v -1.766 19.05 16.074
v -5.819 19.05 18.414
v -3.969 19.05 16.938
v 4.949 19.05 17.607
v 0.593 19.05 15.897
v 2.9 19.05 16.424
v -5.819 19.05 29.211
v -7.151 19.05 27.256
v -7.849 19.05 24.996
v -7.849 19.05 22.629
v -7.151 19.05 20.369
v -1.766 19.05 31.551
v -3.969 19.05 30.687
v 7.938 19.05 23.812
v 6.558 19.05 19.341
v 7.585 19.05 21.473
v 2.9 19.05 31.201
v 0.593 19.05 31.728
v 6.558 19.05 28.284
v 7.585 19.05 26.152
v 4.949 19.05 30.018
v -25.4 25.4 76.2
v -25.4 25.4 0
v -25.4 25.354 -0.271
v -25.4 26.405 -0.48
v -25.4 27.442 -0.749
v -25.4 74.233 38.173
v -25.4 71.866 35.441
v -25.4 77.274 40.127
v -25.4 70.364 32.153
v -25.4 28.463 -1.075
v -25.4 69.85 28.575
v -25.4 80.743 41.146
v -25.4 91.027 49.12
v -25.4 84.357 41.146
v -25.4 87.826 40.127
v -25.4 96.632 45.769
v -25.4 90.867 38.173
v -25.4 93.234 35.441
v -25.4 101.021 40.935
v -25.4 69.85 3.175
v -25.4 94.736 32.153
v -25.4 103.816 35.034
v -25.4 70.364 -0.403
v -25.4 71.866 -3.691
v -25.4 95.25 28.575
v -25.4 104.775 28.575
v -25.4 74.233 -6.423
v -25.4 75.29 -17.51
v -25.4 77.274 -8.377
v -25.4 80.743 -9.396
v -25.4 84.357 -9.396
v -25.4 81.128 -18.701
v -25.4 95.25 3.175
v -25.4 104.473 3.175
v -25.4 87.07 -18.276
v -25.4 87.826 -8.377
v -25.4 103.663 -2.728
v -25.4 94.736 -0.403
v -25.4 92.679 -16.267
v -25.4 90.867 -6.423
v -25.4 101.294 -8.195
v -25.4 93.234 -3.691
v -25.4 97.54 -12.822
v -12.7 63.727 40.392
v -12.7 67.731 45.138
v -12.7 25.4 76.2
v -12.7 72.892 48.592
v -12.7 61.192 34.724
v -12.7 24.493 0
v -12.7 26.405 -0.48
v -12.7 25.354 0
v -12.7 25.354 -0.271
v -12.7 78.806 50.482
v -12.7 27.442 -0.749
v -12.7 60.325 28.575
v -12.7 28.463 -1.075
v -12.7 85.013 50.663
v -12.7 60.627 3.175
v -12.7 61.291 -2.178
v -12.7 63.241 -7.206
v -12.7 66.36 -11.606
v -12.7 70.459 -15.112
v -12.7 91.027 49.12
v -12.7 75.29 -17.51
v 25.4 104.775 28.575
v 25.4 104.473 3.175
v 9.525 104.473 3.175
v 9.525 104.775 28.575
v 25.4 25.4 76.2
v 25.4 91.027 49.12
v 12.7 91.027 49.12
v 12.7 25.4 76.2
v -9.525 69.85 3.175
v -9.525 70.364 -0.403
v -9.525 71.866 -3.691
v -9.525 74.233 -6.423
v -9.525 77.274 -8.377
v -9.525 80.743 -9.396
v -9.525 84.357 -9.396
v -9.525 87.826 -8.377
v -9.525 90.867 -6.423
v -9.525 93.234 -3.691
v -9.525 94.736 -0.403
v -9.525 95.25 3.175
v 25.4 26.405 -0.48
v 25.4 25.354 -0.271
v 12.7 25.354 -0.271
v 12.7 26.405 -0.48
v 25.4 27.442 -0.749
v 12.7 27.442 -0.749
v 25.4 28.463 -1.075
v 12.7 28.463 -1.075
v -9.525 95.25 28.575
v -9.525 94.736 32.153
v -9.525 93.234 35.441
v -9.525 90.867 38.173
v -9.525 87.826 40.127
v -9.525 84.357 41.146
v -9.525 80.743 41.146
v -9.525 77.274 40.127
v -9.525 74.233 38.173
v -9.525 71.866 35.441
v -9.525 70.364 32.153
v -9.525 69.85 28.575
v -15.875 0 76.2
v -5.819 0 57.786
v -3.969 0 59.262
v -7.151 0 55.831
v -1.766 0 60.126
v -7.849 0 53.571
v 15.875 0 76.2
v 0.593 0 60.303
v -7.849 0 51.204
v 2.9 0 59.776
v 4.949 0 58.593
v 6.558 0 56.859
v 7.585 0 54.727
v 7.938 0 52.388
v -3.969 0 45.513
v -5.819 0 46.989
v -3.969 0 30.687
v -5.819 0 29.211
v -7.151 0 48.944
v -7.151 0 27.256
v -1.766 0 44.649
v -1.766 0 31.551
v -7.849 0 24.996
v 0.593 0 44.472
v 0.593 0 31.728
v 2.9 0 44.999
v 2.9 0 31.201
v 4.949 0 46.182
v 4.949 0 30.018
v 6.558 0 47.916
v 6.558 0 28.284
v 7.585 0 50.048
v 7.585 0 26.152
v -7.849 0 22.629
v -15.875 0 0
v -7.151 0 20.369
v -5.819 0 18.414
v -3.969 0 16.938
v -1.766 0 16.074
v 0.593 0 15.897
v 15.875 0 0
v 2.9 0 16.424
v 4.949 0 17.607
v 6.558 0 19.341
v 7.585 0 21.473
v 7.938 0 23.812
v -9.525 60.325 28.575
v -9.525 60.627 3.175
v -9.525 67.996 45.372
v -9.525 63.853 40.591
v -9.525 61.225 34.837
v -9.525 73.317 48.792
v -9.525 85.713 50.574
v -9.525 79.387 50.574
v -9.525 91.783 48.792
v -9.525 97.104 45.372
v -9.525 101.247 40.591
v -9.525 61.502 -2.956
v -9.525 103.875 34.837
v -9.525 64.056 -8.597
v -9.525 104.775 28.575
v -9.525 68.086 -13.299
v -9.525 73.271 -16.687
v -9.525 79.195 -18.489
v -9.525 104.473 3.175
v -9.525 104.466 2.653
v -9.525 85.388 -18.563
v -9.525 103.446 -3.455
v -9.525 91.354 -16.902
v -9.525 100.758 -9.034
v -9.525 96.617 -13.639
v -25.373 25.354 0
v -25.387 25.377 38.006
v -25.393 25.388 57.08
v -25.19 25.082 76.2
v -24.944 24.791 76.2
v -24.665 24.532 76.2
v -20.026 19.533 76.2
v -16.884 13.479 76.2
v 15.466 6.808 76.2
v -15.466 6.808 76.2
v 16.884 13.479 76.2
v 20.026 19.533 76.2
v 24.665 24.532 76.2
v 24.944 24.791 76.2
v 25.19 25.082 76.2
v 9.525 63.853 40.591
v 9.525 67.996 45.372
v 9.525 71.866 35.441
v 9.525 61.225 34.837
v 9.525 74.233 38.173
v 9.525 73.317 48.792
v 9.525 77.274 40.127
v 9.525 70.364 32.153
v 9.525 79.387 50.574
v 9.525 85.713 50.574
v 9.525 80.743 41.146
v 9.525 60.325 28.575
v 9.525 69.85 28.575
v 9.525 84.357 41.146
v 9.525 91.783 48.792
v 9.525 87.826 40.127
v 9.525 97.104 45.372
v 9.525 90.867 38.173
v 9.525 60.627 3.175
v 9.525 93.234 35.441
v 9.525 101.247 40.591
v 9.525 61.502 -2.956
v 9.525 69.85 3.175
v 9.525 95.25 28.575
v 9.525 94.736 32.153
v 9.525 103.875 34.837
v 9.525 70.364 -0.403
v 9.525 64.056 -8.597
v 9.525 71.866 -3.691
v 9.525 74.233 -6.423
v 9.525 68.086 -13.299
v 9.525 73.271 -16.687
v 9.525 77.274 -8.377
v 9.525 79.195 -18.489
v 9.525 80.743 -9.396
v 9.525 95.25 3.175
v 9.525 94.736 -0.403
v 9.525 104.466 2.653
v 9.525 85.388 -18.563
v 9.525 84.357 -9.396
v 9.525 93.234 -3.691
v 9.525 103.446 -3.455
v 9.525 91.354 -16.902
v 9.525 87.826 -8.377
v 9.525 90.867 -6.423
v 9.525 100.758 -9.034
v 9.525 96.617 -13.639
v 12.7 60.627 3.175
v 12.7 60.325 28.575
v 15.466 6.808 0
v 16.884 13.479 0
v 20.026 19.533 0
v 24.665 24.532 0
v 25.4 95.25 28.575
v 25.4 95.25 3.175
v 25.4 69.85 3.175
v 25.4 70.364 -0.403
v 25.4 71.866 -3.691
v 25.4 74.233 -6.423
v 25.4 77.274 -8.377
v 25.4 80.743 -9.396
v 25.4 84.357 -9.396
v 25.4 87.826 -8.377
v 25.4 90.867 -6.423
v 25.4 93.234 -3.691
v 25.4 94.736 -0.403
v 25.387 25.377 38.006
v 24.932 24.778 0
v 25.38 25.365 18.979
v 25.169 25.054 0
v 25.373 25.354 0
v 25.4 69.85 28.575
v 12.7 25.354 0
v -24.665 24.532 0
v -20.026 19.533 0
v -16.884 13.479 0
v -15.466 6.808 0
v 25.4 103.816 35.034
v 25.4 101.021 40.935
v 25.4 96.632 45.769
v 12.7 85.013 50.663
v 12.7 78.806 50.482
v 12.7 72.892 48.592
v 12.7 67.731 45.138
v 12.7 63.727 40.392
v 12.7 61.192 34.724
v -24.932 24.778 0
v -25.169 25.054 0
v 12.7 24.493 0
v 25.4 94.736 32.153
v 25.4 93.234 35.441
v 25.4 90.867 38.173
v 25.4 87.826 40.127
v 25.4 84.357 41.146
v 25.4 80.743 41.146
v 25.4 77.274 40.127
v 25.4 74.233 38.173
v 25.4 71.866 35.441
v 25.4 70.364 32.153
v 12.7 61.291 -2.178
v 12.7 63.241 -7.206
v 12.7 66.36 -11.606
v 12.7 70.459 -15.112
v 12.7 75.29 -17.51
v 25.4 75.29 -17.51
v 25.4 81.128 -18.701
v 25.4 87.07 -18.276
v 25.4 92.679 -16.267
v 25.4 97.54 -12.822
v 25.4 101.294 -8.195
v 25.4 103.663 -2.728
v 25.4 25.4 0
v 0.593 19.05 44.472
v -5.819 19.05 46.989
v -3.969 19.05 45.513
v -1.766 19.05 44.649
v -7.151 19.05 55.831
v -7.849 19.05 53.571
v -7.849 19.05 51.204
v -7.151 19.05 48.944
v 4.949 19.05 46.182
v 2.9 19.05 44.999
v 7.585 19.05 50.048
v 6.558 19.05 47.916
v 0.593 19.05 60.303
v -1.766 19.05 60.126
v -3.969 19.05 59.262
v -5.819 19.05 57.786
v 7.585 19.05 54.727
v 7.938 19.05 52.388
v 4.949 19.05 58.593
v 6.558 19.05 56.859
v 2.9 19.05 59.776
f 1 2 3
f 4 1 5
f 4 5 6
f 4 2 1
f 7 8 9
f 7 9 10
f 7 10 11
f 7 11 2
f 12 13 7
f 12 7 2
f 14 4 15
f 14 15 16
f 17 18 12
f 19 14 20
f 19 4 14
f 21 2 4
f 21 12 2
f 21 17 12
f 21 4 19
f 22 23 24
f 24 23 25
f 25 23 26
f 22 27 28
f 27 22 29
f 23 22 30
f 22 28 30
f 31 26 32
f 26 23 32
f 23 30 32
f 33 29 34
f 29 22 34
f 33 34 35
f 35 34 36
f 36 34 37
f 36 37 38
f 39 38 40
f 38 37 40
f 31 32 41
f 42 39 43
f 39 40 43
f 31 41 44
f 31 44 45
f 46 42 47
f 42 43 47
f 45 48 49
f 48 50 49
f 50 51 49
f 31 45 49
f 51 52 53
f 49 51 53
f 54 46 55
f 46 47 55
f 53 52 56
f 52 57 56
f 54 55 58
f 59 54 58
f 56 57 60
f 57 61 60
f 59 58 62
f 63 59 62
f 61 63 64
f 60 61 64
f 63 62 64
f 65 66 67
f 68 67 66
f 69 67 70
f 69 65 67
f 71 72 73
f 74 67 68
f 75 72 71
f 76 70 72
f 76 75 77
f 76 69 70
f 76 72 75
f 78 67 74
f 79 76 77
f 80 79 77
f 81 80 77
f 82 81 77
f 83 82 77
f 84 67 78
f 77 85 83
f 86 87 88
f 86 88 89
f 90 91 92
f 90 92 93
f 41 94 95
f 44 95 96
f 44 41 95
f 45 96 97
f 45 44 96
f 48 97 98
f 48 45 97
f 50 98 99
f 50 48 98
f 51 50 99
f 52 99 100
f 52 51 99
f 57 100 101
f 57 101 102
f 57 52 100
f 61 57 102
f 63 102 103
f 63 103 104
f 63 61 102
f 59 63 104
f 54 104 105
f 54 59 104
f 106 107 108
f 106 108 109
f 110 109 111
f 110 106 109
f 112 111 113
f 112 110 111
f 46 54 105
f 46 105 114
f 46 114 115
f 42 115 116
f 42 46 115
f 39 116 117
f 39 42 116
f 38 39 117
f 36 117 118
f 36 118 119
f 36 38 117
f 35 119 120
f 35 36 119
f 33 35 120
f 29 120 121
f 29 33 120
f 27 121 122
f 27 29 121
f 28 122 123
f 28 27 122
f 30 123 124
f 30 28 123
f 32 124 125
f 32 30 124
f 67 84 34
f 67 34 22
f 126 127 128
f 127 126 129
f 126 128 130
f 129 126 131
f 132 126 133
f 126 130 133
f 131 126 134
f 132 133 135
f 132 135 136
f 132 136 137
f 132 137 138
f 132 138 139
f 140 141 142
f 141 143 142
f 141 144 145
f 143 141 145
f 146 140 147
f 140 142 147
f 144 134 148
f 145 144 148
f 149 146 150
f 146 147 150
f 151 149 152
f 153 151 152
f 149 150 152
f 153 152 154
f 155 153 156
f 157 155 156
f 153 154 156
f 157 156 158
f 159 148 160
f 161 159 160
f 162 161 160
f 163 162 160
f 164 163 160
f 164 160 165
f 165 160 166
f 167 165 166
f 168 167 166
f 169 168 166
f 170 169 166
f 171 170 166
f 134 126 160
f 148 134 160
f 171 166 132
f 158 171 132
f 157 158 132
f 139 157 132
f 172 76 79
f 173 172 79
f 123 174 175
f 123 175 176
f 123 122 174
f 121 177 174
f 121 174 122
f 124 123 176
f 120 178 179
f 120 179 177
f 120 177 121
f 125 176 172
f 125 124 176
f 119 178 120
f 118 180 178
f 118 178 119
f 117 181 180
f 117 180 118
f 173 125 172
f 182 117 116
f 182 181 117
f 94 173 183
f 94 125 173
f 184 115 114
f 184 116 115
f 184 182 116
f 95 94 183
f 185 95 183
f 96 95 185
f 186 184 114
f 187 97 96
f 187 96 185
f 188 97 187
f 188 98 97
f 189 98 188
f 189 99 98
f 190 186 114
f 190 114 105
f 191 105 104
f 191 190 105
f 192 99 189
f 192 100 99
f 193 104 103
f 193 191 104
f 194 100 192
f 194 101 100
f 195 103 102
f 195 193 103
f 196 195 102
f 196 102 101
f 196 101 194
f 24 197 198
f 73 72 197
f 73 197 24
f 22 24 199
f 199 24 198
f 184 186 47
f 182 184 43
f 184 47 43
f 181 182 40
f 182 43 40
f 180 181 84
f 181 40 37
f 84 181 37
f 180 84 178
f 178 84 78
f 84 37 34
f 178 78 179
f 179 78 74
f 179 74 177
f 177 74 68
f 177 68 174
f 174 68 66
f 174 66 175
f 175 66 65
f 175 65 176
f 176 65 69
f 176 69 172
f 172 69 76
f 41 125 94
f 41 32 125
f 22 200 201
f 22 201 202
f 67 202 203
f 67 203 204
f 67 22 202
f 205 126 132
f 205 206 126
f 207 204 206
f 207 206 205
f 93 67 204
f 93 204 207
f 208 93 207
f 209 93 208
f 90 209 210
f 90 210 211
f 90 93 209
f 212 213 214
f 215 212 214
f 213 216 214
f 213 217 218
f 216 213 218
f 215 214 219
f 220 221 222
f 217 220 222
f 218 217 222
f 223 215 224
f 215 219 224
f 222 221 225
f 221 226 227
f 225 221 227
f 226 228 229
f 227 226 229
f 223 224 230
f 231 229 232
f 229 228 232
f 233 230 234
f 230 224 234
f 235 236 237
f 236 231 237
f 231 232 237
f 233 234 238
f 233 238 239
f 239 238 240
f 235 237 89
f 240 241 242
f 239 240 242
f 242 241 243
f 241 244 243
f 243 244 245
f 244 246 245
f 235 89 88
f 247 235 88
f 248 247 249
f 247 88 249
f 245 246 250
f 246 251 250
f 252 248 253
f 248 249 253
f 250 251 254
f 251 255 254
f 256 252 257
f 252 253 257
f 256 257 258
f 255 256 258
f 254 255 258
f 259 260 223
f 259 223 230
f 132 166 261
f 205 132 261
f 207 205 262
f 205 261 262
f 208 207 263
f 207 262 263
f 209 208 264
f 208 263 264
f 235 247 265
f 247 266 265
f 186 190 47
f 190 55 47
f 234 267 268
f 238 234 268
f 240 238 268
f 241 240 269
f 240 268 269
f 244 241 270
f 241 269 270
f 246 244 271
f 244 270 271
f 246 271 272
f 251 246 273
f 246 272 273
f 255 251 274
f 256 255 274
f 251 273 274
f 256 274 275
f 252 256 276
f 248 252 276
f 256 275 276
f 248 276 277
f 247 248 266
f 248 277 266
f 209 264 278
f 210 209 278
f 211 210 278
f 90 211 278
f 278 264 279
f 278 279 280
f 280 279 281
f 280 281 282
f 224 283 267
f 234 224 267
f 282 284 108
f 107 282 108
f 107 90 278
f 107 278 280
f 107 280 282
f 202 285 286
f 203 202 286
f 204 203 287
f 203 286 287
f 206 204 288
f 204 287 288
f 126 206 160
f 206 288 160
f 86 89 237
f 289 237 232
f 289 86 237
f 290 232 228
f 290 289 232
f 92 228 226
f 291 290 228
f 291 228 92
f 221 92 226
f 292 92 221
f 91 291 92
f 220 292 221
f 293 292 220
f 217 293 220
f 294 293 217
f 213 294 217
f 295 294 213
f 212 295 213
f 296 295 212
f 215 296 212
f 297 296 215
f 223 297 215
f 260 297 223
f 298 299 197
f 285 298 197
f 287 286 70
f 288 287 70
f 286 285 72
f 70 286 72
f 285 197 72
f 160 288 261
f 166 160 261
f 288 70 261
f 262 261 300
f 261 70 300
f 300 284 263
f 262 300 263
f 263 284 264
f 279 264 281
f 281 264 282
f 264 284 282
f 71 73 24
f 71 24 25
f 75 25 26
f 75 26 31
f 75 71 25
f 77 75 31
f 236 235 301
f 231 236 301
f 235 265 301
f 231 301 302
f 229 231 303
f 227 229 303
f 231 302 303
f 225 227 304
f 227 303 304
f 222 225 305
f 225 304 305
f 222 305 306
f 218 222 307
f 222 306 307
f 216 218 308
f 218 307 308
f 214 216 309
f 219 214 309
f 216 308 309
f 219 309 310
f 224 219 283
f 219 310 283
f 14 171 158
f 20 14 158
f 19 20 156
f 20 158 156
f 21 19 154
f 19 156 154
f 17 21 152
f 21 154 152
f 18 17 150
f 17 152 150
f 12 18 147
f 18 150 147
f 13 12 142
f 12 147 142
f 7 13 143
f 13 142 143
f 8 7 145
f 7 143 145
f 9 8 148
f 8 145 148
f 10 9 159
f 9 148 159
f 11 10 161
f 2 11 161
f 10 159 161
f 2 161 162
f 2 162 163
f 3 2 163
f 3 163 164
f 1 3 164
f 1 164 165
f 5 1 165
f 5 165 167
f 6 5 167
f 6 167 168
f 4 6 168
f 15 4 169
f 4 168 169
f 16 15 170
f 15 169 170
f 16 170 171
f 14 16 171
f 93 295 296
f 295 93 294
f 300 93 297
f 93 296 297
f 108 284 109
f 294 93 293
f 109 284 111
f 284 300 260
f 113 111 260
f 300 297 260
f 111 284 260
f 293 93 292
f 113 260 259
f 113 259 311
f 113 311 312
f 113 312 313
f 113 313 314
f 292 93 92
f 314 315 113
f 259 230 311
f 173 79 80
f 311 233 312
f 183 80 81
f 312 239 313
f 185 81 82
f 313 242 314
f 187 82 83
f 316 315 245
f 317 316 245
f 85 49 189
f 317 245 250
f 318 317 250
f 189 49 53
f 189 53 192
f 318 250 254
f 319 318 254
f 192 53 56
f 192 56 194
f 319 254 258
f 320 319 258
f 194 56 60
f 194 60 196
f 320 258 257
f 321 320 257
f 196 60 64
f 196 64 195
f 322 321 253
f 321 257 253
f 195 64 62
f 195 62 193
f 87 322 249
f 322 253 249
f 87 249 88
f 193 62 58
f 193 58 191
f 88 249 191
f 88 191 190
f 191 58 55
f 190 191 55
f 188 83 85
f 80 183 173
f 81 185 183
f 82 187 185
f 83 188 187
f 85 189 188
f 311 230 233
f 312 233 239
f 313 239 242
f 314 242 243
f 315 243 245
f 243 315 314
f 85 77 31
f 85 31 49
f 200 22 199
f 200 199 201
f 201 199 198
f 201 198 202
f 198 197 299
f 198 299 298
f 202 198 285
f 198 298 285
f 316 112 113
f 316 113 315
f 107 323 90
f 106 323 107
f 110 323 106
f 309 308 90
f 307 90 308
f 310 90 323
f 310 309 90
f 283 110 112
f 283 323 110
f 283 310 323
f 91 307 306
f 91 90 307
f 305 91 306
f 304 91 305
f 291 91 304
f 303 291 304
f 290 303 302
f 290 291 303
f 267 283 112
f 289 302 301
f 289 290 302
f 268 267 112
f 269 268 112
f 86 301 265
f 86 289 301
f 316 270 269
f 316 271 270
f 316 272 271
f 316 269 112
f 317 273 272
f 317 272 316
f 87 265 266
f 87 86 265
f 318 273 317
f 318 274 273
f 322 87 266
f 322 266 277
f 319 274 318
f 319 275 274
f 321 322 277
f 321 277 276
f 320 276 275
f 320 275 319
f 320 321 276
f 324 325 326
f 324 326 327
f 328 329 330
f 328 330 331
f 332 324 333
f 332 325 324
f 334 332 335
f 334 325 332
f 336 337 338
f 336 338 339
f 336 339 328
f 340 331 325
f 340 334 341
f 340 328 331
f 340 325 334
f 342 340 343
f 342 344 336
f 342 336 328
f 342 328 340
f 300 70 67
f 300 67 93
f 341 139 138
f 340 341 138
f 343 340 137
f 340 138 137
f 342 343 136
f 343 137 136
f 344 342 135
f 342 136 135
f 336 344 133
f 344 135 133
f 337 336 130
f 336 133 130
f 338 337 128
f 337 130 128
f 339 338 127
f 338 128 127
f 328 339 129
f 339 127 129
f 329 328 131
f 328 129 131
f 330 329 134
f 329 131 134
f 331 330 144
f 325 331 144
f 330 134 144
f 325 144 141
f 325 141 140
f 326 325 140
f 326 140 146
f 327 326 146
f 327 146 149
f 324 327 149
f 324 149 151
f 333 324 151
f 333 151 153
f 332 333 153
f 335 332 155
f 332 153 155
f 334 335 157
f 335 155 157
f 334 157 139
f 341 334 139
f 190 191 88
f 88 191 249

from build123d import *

# Parameters (mm, degrees)
BOSS_EXTRUDE1_DEPTH = 76.2
BOSS_EXTRUDE3_DEPTH = 25.4
SKETCH4_W           = 25.4
SKETCH4_H           = 94.262089718
CUT_EXTRUDE1_DEPTH  = 79.936326
BOSS_EXTRUDE4_START = 12.7
BOSS_EXTRUDE4_DEPTH = 3.175
BOSS_EXTRUDE5_START = -12.7
BOSS_EXTRUDE5_DEPTH = 3.175
SKETCH5_R           = 7.9375
CUT_EXTRUDE2_DEPTH  = 19.05


with BuildPart() as part:
    # Sketch2 → Boss-Extrude1 (new body)
    with BuildSketch(Plane.XY):
        with BuildLine():
            Line((-15.875, 0), (15.875, 0))
            ThreePointArc((15.875, 0), (16.884197435, 13.479245674), (24.665075731, 24.532140152))
            ThreePointArc((24.665075731, 24.532140152), (25.071711114, 24.932897242), (25.4, 25.4))
            Line((25.4, 25.4), (-25.4, 25.4))
            ThreePointArc((-25.4, 25.4), (-25.071711114, 24.932897242), (-24.665075731, 24.532140152))
            ThreePointArc((-24.665075731, 24.532140152), (-16.884197435, 13.479245674), (-15.875, 0))
        make_face()
    extrude(amount=BOSS_EXTRUDE1_DEPTH)

    # Sketch3 → Boss-Extrude3 (add, symmetric)
    with BuildSketch(Plane(origin=(0, 0, 0), x_dir=(0, 0, -1), z_dir=(1, 0, 0))):
        with BuildLine():
            Line((-28.575, 60.325), (-3.175, 60.627395043))
            ThreePointArc((-3.175, 60.627395043), (18.747604957, 82.55), (-3.175, 104.472604957))
            Line((-3.175, 104.472604957), (-28.575, 104.775))
            ThreePointArc((-28.575, 104.775), (-50.8, 82.55), (-28.575, 60.325))
        make_face()
        with BuildLine():
            ThreePointArc((-3.175, 69.85), (9.525, 82.55), (-3.175, 95.25))
            Line((-3.175, 95.25), (-28.575, 95.25))
            ThreePointArc((-28.575, 95.25), (-41.275, 82.55), (-28.575, 69.85))
            Line((-28.575, 69.85), (-3.175, 69.85))
        make_face(mode=Mode.SUBTRACT)
        with BuildLine():
            Line((-76.2, 25.4), (0.270677579, 25.353877505))
            ThreePointArc((0.270677579, 25.353877505), (0.607218741, 26.92535435), (1.075018311, 28.462872802))
            Line((1.075018311, 28.462872802), (17.510481505, 75.289733957))
            ThreePointArc((17.510481505, 75.289733957), (9.502473403, 64.664746962), (-3.175, 60.627395043))
            Line((-3.175, 60.627395043), (-28.575, 60.325))
            ThreePointArc((-28.575, 60.325), (-47.046096671, 70.190015665), (-49.119653814, 91.02748929))
            Line((-49.119653814, 91.02748929), (-76.2, 25.4))
        make_face()
    extrude(amount=BOSS_EXTRUDE3_DEPTH, both=True)

    # Sketch4 → Cut-Extrude1 (cut)
    with BuildSketch(Plane(origin=(0, 104.420005444, -1.243153229), x_dir=(1, 0, 0), z_dir=(0, 0.999929139, -0.011904473))):
        with Locations((0, -29.365929167)):
            Rectangle(SKETCH4_W, SKETCH4_H)
    extrude(amount=-CUT_EXTRUDE1_DEPTH, mode=Mode.SUBTRACT)

    # Sketch3<7> → Boss-Extrude4 (add)
    with BuildSketch(Plane(origin=(0, 0, 0), x_dir=(0, 0, -1), z_dir=(1, 0, 0)).offset(BOSS_EXTRUDE4_START)):
        with BuildLine():
            Line((-28.575, 60.325), (-3.175, 60.627395043))
            ThreePointArc((-3.175, 60.627395043), (18.747604957, 82.55), (-3.175, 104.472604957))
            Line((-3.175, 104.472604957), (-28.575, 104.775))
            ThreePointArc((-28.575, 104.775), (-50.8, 82.55), (-28.575, 60.325))
        make_face()
        with BuildLine():
            ThreePointArc((-3.175, 69.85), (9.525, 82.55), (-3.175, 95.25))
            Line((-3.175, 95.25), (-28.575, 95.25))
            ThreePointArc((-28.575, 95.25), (-41.275, 82.55), (-28.575, 69.85))
            Line((-28.575, 69.85), (-3.175, 69.85))
        make_face(mode=Mode.SUBTRACT)
    extrude(amount=-BOSS_EXTRUDE4_DEPTH)

    # Sketch3<8> → Boss-Extrude5 (add)
    with BuildSketch(Plane(origin=(0, 0, 0), x_dir=(0, 0, -1), z_dir=(1, 0, 0)).offset(BOSS_EXTRUDE5_START)):
        with BuildLine():
            Line((-28.575, 60.325), (-3.175, 60.627395043))
            ThreePointArc((-3.175, 60.627395043), (18.747604957, 82.55), (-3.175, 104.472604957))
            Line((-3.175, 104.472604957), (-28.575, 104.775))
            ThreePointArc((-28.575, 104.775), (-50.8, 82.55), (-28.575, 60.325))
        make_face()
        with BuildLine():
            ThreePointArc((-3.175, 69.85), (9.525, 82.55), (-3.175, 95.25))
            Line((-3.175, 95.25), (-28.575, 95.25))
            ThreePointArc((-28.575, 95.25), (-41.275, 82.55), (-28.575, 69.85))
            Line((-28.575, 69.85), (-3.175, 69.85))
        make_face(mode=Mode.SUBTRACT)
    extrude(amount=BOSS_EXTRUDE5_DEPTH)

    # Sketch5 → Cut-Extrude2 (cut)
    with BuildSketch(Plane.XZ):
        with Locations((0, 52.3875)):
            Circle(SKETCH5_R)
        with Locations((0, 23.8125)):
            Circle(SKETCH5_R)
    extrude(amount=-CUT_EXTRUDE2_DEPTH, mode=Mode.SUBTRACT)


solid = part.part
